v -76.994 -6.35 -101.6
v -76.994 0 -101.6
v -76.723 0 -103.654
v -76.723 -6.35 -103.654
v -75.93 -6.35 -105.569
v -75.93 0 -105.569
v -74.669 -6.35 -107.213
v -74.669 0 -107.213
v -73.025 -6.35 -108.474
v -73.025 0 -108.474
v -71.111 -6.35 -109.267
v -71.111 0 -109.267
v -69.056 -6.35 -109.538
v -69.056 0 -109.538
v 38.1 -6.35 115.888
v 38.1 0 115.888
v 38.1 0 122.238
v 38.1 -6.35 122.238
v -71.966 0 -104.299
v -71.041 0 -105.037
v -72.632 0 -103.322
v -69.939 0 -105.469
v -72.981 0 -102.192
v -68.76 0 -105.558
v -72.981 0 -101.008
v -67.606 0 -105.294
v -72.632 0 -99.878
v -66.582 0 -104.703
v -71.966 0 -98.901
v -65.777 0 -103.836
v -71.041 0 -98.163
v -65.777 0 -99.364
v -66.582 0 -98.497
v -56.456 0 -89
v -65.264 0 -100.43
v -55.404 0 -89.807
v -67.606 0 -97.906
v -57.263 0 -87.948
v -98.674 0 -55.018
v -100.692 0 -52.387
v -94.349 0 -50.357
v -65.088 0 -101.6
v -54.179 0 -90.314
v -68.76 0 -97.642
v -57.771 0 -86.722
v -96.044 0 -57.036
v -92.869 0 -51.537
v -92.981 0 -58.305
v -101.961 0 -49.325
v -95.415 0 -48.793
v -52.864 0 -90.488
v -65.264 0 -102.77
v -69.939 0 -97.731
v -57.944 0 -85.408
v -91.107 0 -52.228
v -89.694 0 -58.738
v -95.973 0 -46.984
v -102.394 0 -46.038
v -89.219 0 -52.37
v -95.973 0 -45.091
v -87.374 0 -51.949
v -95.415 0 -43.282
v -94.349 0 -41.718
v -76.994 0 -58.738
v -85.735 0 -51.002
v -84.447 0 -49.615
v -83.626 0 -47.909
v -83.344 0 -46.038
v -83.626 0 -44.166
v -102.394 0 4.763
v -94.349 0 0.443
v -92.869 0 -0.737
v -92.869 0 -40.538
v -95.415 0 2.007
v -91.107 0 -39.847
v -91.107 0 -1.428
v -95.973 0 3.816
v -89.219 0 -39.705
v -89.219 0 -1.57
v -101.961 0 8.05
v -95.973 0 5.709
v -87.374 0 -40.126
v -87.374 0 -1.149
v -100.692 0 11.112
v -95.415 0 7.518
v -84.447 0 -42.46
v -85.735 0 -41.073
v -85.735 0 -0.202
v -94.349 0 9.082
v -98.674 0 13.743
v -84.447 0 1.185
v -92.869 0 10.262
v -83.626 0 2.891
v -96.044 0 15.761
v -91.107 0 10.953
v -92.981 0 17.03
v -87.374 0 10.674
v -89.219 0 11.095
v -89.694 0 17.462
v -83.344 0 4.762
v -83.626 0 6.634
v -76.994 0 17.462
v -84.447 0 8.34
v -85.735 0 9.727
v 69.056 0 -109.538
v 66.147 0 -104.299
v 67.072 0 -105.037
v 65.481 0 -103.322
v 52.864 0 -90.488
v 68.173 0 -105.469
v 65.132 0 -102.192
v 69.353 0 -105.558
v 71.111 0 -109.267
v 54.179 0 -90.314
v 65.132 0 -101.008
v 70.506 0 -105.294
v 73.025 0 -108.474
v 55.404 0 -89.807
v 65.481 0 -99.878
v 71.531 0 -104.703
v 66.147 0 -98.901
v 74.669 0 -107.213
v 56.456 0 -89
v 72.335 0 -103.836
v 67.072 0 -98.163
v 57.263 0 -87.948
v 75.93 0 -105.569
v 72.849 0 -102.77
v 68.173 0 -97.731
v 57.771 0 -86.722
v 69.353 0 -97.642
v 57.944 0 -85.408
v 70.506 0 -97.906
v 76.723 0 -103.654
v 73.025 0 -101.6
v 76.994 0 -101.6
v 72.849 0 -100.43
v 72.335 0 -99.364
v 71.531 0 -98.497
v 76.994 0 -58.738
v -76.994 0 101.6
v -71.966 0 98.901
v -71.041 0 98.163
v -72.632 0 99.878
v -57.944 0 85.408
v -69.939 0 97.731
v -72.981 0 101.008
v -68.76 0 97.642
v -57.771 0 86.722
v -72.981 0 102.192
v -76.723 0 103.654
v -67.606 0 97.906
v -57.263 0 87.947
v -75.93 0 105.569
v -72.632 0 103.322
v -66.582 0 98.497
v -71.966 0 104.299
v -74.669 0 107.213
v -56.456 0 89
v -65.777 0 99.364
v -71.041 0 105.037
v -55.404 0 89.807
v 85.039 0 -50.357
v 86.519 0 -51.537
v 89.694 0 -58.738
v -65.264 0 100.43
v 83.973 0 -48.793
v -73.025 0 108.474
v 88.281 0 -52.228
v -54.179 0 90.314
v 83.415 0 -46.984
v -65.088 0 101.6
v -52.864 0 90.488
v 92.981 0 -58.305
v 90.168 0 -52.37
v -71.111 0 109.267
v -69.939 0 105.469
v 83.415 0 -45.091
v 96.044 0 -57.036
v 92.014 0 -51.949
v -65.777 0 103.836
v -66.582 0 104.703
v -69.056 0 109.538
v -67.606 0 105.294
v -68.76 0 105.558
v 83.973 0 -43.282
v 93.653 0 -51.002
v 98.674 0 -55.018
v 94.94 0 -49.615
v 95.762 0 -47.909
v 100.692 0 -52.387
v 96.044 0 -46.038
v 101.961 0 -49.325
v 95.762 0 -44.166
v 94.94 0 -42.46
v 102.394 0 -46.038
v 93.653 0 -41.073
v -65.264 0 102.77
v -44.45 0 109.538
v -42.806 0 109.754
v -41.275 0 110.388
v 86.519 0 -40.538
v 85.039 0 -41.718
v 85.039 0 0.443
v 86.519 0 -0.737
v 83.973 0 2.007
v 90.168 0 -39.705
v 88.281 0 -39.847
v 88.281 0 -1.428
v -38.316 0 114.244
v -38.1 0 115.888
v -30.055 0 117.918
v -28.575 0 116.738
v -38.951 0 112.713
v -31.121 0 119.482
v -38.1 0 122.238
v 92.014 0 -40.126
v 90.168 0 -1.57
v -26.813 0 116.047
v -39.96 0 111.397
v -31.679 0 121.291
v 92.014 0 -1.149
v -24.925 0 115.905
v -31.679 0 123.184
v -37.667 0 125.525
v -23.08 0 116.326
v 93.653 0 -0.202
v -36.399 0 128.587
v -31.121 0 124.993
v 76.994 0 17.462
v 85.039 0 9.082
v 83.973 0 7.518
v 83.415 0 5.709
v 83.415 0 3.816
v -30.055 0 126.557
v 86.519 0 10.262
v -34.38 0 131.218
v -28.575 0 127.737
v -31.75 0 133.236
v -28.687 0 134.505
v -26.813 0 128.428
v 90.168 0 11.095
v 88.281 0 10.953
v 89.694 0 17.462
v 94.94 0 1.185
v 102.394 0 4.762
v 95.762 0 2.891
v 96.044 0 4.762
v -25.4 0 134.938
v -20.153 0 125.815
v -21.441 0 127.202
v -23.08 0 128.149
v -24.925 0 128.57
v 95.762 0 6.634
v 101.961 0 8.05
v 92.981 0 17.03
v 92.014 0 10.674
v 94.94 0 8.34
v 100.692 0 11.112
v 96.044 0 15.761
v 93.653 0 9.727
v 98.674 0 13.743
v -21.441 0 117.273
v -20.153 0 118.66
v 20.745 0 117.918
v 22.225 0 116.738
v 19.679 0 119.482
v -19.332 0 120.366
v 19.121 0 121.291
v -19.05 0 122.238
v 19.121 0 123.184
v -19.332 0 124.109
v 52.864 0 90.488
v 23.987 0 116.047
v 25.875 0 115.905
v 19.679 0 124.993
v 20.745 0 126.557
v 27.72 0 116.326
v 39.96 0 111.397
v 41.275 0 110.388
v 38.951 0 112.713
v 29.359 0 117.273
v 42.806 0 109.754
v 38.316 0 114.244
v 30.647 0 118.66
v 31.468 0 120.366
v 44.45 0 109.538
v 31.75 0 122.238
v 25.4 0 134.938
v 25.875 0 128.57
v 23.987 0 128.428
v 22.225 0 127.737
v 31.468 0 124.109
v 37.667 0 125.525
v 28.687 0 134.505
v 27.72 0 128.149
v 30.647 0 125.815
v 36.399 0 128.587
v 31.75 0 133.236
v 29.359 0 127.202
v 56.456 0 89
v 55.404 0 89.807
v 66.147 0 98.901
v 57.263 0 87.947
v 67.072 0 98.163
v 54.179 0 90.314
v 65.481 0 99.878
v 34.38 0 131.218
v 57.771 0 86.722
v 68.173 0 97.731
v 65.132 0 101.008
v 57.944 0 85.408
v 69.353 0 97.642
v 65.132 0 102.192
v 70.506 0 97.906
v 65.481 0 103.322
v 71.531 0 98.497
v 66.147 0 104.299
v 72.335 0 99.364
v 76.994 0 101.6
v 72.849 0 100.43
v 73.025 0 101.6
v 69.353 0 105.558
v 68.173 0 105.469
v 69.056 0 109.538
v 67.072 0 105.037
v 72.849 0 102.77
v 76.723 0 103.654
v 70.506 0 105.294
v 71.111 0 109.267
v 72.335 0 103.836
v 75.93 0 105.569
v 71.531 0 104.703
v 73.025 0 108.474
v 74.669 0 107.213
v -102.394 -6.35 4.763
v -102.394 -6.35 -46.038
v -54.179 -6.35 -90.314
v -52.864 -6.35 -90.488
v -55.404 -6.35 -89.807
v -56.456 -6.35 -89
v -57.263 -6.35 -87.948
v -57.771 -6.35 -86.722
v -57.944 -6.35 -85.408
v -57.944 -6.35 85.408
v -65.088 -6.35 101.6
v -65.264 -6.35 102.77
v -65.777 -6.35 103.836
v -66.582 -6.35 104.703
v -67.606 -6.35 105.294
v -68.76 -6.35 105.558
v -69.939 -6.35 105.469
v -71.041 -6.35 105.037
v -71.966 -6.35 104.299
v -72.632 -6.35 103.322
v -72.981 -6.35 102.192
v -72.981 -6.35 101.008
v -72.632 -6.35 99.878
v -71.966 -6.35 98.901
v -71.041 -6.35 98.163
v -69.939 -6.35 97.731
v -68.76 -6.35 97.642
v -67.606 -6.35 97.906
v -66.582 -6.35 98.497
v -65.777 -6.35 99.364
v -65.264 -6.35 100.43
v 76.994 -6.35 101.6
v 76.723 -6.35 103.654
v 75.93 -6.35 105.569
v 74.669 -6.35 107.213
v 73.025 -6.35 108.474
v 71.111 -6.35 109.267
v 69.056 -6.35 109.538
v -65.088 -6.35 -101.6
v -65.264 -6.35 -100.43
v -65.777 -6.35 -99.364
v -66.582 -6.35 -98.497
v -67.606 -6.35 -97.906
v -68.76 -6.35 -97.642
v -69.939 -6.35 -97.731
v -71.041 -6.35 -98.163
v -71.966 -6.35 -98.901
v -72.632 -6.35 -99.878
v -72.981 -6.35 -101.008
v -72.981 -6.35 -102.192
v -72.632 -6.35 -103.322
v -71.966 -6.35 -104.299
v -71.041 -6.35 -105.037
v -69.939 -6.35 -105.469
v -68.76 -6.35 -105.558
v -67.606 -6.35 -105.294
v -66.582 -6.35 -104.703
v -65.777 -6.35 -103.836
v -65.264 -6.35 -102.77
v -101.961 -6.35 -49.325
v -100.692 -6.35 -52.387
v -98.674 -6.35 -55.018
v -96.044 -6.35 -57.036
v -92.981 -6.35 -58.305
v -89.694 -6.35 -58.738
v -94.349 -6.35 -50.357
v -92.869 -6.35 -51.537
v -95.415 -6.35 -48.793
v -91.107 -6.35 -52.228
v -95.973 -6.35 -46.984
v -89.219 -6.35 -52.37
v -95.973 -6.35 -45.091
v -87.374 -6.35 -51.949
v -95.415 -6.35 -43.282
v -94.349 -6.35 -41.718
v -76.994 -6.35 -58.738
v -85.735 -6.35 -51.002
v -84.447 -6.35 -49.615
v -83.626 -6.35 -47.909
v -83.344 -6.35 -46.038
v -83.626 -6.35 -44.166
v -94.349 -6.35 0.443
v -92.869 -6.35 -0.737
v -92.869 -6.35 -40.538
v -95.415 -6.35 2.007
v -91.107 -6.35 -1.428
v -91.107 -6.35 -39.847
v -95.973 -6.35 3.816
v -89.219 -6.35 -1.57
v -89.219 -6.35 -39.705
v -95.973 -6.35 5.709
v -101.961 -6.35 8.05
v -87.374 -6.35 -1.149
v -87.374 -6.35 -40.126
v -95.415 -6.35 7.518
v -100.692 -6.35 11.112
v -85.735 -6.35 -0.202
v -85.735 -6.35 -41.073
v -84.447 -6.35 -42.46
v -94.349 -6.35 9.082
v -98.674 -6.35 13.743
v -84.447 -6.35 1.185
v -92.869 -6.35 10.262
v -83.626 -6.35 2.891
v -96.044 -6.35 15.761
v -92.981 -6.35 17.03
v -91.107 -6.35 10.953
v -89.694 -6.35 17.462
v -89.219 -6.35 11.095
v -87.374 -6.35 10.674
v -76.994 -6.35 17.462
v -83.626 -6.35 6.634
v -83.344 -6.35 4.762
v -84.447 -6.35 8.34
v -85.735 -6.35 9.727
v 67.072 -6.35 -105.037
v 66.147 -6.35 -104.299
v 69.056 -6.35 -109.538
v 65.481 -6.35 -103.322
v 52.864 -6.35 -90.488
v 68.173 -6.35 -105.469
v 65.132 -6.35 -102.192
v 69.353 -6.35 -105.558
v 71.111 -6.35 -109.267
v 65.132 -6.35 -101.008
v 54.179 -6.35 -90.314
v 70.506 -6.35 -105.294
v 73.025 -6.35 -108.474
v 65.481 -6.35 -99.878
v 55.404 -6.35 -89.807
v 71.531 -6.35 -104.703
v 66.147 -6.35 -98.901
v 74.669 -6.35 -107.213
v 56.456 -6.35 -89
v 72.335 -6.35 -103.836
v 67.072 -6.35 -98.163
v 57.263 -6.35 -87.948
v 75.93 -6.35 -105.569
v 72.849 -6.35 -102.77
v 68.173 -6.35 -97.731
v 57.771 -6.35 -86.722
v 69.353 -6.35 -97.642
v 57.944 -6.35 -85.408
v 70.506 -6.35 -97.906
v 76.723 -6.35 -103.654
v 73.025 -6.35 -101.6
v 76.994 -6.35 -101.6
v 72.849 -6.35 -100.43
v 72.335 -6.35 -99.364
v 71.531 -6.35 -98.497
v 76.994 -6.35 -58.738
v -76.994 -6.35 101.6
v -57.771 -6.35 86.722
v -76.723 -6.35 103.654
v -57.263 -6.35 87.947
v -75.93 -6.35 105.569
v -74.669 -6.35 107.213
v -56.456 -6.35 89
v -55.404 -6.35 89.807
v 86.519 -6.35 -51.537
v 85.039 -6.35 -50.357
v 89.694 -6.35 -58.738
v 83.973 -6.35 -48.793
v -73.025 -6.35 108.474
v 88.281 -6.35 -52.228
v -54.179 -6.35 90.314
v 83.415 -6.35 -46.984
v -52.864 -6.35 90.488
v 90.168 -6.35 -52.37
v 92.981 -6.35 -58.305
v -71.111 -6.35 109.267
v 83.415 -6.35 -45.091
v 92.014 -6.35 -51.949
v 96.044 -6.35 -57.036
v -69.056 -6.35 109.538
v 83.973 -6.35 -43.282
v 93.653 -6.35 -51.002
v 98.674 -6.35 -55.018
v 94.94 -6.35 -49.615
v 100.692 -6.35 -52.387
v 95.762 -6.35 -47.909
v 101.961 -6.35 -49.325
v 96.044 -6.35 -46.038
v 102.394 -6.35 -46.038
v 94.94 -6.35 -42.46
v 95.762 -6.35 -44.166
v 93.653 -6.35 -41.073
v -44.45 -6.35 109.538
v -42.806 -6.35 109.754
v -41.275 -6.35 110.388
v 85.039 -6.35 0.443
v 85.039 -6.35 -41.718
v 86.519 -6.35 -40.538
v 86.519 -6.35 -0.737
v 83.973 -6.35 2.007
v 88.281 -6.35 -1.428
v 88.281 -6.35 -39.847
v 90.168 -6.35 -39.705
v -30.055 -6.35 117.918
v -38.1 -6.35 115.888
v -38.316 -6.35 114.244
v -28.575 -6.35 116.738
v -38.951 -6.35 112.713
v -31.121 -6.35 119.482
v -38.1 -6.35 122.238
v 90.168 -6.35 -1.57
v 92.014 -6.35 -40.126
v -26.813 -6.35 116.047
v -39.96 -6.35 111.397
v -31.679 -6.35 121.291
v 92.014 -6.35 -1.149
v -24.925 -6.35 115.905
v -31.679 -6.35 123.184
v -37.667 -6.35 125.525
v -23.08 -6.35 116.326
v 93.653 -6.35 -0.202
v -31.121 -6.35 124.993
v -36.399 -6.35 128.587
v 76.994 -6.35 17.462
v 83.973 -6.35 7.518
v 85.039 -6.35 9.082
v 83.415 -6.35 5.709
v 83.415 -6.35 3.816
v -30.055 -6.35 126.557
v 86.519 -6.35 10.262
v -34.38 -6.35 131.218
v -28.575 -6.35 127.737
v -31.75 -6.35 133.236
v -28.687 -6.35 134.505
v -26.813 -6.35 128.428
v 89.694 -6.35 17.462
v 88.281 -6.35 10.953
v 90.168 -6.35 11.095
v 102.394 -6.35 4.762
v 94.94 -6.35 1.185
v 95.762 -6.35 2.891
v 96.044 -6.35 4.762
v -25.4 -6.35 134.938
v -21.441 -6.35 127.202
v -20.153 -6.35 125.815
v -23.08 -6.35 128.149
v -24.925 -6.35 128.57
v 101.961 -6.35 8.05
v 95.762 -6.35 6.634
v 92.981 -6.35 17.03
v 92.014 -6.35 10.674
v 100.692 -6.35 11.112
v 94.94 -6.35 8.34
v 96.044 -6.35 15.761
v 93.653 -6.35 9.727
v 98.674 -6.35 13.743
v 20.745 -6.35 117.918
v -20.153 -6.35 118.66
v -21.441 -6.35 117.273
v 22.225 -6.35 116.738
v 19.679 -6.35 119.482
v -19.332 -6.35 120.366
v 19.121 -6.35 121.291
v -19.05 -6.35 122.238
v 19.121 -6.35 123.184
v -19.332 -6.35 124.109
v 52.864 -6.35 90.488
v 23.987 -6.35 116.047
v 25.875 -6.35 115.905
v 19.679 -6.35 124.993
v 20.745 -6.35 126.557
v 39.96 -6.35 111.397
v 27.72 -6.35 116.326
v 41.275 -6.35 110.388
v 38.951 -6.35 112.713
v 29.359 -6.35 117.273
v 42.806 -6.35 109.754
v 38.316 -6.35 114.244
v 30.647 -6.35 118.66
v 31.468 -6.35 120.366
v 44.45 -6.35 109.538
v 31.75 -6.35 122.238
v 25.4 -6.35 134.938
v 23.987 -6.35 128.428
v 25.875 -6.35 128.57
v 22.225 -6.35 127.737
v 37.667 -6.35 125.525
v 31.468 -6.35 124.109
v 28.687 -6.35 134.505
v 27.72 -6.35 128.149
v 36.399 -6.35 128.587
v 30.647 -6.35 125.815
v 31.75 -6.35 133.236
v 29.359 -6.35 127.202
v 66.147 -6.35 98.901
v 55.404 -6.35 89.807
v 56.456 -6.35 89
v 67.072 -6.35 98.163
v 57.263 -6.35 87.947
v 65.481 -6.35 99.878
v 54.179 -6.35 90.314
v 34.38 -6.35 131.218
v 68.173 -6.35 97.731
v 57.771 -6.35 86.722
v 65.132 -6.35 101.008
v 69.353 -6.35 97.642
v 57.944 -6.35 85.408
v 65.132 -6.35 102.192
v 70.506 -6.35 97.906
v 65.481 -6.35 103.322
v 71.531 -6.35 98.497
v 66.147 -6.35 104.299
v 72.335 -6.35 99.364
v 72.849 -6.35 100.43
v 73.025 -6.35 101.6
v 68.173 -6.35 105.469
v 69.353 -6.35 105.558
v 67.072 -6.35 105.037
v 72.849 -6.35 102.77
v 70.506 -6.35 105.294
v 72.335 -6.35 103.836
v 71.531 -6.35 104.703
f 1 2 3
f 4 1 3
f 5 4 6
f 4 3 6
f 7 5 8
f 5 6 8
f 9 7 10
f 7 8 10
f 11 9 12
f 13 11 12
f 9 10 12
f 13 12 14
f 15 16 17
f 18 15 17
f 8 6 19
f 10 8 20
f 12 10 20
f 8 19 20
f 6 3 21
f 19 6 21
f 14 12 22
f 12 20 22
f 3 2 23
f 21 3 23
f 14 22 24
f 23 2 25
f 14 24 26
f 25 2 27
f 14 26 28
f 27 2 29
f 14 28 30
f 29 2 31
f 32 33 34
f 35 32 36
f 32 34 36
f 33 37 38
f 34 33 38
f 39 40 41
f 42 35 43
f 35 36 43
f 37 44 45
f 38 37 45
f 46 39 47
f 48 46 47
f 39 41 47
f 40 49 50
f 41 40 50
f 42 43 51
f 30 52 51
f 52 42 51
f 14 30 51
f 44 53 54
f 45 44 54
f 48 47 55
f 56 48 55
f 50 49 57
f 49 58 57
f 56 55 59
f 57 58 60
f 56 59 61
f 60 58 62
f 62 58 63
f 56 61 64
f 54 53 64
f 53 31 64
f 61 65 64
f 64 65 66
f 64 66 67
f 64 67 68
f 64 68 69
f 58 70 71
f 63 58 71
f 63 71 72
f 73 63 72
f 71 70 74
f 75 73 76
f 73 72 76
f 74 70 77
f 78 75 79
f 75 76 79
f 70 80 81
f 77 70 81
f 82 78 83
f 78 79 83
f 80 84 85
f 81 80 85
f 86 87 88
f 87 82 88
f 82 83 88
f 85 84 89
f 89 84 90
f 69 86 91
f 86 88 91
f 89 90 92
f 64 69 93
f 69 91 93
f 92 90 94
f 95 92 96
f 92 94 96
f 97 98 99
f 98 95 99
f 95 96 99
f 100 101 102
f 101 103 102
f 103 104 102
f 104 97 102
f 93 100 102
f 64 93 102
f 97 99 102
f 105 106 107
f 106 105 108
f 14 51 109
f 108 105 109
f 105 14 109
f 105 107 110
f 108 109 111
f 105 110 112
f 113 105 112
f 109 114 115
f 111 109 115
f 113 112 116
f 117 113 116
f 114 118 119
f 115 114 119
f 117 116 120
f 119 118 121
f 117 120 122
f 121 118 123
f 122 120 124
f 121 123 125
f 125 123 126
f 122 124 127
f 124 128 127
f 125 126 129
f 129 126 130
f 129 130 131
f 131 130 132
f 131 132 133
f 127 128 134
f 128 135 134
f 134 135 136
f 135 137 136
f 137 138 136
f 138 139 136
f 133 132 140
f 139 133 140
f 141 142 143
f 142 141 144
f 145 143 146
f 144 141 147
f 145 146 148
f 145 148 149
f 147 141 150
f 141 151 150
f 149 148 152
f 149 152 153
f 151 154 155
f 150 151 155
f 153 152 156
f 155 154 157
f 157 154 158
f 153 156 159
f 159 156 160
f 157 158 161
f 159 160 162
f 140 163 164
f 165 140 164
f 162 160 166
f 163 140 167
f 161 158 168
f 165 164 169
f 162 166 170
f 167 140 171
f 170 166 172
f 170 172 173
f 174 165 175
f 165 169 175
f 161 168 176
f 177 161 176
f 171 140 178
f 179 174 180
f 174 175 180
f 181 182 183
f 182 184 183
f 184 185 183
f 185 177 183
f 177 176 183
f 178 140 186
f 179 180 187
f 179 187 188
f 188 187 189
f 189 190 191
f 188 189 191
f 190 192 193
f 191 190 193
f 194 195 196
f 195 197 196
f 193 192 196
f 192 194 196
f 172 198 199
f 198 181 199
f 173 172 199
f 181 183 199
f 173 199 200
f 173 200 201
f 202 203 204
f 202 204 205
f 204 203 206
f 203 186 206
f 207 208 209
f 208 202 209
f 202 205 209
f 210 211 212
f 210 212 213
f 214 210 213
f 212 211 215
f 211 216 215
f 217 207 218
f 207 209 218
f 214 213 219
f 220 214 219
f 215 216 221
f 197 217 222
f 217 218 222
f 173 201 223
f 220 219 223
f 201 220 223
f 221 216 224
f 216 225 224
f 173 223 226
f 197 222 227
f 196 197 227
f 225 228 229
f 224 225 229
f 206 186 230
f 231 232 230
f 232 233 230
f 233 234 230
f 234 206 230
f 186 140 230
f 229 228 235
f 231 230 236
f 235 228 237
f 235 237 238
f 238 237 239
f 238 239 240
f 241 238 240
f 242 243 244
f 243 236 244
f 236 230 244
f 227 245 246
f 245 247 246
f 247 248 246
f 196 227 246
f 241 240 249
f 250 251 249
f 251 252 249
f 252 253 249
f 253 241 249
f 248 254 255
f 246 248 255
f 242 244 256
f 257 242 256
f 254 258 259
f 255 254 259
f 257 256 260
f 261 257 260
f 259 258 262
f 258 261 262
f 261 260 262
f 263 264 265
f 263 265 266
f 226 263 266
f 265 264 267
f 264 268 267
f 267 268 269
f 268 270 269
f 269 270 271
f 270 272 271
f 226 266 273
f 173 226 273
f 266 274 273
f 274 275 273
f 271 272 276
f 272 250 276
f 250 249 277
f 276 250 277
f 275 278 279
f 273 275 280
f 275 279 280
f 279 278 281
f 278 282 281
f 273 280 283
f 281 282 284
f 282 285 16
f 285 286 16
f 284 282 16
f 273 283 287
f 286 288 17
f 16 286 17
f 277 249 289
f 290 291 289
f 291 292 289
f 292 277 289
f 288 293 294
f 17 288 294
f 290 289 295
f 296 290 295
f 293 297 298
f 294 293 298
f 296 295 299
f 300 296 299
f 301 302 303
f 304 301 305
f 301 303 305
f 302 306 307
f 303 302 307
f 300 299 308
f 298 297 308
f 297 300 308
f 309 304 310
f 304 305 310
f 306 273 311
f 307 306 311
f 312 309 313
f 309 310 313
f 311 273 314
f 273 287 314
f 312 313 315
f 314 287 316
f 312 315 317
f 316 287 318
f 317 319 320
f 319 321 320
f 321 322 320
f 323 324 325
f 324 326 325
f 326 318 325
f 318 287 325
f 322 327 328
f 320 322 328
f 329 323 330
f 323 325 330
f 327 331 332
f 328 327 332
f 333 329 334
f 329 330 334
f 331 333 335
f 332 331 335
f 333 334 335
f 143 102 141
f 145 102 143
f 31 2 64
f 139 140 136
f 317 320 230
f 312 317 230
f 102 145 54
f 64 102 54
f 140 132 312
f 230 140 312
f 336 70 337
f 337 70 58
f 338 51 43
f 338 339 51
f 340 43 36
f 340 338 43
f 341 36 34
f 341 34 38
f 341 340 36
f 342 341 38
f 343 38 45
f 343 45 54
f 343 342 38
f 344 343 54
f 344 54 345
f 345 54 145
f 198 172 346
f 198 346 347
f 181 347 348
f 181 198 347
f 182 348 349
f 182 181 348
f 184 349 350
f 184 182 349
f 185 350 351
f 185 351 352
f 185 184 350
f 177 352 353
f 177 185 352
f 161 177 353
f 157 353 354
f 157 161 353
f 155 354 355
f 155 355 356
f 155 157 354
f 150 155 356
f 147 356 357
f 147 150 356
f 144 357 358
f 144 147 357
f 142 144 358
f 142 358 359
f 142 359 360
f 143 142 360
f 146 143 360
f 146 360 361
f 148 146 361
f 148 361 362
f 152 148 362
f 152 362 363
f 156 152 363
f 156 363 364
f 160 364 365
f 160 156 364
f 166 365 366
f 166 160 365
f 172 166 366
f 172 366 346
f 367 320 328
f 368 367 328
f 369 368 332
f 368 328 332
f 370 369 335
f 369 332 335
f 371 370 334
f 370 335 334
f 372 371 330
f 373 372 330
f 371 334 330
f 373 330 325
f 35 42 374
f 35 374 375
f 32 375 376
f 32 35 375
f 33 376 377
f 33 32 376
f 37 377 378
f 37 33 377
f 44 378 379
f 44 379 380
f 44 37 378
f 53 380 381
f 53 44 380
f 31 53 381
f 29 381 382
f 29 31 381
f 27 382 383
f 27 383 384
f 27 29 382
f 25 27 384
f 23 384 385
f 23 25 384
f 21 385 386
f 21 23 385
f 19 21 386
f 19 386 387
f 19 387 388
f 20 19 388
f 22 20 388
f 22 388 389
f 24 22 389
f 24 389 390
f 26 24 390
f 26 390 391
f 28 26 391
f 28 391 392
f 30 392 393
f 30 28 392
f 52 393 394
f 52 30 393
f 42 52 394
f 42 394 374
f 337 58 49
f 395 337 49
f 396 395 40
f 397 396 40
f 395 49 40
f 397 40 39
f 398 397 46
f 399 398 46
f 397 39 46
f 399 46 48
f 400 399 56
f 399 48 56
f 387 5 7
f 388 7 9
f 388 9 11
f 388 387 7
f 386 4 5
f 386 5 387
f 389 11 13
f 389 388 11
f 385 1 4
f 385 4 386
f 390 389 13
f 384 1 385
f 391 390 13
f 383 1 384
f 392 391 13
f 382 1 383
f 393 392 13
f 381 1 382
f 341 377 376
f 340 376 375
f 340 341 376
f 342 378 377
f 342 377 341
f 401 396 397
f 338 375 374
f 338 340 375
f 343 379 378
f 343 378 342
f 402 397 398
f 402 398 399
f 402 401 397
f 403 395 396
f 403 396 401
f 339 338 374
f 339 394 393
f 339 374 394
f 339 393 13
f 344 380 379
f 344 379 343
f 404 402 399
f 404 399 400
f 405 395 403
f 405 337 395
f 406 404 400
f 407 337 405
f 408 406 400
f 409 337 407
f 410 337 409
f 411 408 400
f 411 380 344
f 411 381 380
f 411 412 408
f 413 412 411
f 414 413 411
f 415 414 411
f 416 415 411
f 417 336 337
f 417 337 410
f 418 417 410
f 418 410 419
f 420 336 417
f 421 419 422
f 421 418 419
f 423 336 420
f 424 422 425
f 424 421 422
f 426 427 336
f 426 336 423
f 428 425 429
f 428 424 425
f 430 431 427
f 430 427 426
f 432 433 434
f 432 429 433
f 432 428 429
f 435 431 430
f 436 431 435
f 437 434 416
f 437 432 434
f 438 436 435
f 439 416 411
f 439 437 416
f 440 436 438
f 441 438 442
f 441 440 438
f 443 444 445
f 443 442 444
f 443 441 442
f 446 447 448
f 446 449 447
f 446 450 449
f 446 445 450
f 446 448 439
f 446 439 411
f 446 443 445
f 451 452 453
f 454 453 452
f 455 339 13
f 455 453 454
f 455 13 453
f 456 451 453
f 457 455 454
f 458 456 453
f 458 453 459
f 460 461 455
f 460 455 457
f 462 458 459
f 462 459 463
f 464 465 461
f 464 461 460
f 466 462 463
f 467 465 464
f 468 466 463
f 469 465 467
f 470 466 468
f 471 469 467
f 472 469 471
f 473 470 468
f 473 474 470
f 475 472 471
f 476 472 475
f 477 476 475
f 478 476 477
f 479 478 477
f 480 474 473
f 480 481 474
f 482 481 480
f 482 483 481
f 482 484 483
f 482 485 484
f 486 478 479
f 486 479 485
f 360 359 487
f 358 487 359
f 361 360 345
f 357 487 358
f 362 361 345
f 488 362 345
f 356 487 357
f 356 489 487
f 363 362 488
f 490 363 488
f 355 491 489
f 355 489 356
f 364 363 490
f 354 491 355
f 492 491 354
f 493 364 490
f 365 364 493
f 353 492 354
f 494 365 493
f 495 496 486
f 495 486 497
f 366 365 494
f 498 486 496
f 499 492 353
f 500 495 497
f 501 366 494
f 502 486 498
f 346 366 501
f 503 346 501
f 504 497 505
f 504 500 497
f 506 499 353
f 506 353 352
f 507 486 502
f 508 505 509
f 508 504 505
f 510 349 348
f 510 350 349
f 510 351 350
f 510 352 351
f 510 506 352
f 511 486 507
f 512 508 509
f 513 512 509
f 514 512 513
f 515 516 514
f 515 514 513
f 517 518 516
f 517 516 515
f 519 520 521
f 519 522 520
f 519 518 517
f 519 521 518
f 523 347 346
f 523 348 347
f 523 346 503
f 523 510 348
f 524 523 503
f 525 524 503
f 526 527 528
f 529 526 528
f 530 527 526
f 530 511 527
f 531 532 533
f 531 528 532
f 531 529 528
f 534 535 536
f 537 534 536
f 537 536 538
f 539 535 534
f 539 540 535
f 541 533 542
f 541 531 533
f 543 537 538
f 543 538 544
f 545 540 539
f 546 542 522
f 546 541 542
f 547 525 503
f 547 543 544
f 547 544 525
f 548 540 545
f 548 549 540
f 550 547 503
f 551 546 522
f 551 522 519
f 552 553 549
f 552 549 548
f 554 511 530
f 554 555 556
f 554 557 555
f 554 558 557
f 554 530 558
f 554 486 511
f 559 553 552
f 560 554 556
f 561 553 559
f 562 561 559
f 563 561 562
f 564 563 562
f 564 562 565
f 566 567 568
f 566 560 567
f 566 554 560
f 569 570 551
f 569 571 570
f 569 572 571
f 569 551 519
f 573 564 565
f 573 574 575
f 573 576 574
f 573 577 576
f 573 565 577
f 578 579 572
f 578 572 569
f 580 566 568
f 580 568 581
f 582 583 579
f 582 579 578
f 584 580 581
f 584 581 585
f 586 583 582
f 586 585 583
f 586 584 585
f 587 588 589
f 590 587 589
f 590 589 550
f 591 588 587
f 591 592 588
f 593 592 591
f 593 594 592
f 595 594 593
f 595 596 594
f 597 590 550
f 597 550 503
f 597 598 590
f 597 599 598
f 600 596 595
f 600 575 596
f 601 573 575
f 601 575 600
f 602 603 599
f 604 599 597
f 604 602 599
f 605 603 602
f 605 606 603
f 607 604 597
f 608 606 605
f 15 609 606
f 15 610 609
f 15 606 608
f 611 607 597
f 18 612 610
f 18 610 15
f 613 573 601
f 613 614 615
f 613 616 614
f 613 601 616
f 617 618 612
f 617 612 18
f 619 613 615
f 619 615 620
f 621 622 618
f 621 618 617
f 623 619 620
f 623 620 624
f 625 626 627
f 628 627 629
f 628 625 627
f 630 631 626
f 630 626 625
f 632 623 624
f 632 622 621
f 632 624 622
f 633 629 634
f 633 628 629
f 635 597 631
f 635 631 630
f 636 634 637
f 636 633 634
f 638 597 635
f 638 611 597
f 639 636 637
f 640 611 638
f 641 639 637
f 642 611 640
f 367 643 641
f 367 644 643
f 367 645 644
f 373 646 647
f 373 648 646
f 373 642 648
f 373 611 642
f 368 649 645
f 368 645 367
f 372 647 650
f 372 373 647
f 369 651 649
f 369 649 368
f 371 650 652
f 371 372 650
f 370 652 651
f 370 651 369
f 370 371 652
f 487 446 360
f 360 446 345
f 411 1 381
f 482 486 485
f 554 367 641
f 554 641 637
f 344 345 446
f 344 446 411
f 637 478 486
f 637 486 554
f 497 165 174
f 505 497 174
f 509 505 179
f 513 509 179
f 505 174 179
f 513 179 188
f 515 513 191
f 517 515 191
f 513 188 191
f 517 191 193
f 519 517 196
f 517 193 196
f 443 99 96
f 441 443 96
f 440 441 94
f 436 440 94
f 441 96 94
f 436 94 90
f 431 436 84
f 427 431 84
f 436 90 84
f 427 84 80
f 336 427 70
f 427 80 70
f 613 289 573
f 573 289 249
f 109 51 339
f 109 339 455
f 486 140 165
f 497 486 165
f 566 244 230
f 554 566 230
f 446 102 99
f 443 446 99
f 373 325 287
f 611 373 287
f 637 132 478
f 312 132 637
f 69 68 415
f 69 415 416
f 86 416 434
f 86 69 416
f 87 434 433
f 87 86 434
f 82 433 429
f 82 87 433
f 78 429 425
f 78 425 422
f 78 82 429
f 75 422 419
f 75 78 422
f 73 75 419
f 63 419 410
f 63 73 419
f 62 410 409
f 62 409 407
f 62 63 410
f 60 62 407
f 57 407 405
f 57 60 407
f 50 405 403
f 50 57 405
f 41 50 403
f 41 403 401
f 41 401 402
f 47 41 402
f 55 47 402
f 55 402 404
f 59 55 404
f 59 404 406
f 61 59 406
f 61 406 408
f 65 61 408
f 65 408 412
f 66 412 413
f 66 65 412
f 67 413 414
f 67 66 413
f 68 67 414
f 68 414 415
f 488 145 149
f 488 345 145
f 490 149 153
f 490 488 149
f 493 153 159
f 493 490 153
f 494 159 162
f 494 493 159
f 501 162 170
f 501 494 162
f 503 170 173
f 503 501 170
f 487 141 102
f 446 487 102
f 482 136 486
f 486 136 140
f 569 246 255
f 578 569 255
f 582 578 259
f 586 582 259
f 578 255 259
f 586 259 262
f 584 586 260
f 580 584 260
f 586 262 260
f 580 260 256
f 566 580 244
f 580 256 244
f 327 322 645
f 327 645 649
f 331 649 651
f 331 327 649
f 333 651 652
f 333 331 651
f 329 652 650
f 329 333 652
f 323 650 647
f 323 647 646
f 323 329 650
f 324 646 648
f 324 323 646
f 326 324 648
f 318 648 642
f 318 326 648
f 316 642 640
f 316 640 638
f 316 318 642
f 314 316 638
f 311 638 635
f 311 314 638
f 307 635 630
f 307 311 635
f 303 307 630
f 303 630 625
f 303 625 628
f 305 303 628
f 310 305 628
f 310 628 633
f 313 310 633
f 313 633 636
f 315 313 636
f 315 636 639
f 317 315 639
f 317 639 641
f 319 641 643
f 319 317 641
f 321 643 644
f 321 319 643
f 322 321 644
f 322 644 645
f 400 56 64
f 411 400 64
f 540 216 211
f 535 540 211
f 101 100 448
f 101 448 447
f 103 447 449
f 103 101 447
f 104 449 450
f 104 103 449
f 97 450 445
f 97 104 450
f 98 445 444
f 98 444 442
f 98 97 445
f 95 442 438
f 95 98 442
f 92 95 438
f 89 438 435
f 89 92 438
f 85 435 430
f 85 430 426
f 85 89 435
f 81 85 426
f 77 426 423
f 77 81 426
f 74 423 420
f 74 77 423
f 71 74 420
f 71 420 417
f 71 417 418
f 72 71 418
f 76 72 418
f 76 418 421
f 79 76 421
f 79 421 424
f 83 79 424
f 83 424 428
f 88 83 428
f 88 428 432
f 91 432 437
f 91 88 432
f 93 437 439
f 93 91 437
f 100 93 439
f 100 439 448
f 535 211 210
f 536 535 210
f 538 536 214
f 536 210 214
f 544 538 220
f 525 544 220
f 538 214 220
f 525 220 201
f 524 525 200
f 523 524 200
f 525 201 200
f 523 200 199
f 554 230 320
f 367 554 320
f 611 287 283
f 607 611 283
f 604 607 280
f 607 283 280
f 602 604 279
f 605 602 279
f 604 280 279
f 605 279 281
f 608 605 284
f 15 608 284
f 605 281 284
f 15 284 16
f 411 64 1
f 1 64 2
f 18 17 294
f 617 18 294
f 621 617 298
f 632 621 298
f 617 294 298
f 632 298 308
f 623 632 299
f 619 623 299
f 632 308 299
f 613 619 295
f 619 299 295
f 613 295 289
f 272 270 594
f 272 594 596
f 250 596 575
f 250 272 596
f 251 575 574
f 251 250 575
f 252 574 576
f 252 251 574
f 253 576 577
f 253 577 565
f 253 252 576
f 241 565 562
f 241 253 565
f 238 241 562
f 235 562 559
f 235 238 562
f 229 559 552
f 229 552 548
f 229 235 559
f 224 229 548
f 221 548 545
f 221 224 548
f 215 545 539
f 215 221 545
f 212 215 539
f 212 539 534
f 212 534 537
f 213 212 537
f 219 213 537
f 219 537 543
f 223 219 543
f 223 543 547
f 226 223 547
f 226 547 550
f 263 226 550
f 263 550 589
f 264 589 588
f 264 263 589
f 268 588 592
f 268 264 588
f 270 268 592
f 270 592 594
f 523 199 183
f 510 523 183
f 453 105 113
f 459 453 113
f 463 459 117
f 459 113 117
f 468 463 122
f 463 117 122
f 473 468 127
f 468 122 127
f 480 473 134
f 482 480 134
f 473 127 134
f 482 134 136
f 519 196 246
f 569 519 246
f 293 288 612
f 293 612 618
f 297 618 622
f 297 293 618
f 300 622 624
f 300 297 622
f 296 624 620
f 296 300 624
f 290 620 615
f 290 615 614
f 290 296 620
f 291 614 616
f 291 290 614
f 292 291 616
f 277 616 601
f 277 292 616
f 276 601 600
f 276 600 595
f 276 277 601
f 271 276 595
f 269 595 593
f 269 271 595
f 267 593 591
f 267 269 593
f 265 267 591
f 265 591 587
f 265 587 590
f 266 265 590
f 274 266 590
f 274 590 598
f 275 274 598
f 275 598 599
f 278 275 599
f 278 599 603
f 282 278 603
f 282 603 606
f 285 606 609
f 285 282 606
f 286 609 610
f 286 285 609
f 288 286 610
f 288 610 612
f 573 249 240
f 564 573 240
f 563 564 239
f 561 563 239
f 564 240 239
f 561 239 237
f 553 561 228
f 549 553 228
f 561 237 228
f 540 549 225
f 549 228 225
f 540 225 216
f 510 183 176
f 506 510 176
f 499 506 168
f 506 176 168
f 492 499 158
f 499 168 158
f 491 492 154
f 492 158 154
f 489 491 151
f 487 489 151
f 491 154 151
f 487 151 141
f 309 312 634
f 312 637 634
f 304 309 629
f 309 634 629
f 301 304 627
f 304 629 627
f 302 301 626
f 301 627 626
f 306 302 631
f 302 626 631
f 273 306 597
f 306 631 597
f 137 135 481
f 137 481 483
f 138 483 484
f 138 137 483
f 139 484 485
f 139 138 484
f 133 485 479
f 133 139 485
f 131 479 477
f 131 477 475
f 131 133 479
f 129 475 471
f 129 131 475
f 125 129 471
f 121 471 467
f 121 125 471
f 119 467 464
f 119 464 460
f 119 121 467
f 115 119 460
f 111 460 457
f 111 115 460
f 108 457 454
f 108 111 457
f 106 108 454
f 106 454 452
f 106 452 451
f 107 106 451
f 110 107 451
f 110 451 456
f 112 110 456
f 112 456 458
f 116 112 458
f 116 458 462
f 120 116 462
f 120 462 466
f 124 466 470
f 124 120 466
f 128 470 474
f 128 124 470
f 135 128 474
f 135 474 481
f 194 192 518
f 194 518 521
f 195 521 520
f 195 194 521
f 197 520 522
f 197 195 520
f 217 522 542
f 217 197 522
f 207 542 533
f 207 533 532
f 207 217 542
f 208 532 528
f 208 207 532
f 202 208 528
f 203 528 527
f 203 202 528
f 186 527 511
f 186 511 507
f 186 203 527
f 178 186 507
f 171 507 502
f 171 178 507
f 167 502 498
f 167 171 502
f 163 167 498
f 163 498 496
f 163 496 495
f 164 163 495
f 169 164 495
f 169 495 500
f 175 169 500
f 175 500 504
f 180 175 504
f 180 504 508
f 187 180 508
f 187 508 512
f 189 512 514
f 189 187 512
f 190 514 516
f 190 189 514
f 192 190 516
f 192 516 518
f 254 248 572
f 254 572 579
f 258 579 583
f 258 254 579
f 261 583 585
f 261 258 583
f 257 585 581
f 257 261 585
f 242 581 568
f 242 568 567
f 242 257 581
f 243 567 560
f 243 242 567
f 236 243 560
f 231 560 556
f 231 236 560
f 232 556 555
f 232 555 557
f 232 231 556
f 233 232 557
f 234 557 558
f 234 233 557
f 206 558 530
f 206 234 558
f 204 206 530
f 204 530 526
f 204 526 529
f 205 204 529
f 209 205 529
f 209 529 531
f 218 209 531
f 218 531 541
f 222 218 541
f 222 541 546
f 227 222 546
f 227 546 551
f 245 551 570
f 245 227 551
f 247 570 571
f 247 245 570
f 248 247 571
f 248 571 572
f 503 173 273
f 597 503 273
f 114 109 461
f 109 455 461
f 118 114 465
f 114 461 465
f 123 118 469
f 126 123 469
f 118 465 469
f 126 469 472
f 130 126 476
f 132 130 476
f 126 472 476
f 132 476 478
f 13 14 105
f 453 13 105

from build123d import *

# Parameters (mm, degrees)
F0_R     = 3.96875
F0_R_2   = 6.35
F0_W     = 115.8875
F0_H     = 180.975
F1_DEPTH = 6.35
F2_R     = 5.08


with BuildPart() as f1:
    # F0 (on Front) → F1 (new body)
    with BuildSketch(Plane.XZ):
        with BuildLine():
            Line((-44.45, 109.5375), (-69.05625, 109.5375))
            ThreePointArc((-69.05625, 109.5375), (-74.66891, 107.21266), (-76.99375, 101.6))
            Line((-76.99375, 101.6), (-76.99375, 17.4625))
            Line((-76.99375, 17.4625), (-89.69375, 17.4625))
            ThreePointArc((-89.69375, 17.4625), (-98.674006, 13.742756), (-102.39375, 4.7625))
            Line((-102.39375, 4.7625), (-102.39375, -46.0375))
            ThreePointArc((-102.39375, -46.0375), (-98.674006, -55.017756), (-89.69375, -58.7375))
            Line((-89.69375, -58.7375), (-76.99375, -58.7375))
            Line((-76.99375, -58.7375), (-76.99375, -101.6))
            ThreePointArc((-76.99375, -101.6), (-74.66891, -107.21266), (-69.05625, -109.5375))
            Line((-69.05625, -109.5375), (69.05625, -109.5375))
            ThreePointArc((69.05625, -109.5375), (74.66891, -107.21266), (76.99375, -101.6))
            Line((76.99375, -101.6), (76.99375, -58.7375))
            Line((76.99375, -58.7375), (89.69375, -58.7375))
            ThreePointArc((89.69375, -58.7375), (98.674006, -55.017756), (102.39375, -46.0375))
            Line((102.39375, -46.0375), (102.39375, 4.7625))
            ThreePointArc((102.39375, 4.7625), (98.674006, 13.742756), (89.69375, 17.4625))
            Line((89.69375, 17.4625), (76.99375, 17.4625))
            Line((76.99375, 17.4625), (76.99375, 101.6))
            ThreePointArc((76.99375, 101.6), (74.66891, 107.21266), (69.05625, 109.5375))
            Line((69.05625, 109.5375), (44.45, 109.5375))
            ThreePointArc((44.45, 109.5375), (39.959872, 111.397372), (38.1, 115.8875))
            Line((38.1, 115.8875), (38.1, 122.2375))
            ThreePointArc((38.1, 122.2375), (34.380256, 131.217756), (25.4, 134.9375))
            Line((25.4, 134.9375), (-25.4, 134.9375))
            ThreePointArc((-25.4, 134.9375), (-34.380256, 131.217756), (-38.1, 122.2375))
            Line((-38.1, 122.2375), (-38.1, 115.8875))
            ThreePointArc((-38.1, 115.8875), (-39.959872, 111.397372), (-44.45, 109.5375))
        make_face()
        with Locations((-69.05625, -101.6)):
            Circle(F0_R, mode=Mode.SUBTRACT)
        with Locations((-89.69375, -46.0375)):
            Circle(F0_R_2, mode=Mode.SUBTRACT)
        with Locations((-89.69375, 4.7625)):
            Circle(F0_R_2, mode=Mode.SUBTRACT)
        with Locations((69.05625, -101.6)):
            Circle(F0_R, mode=Mode.SUBTRACT)
        Rectangle(F0_W, F0_H, mode=Mode.SUBTRACT)
        with Locations((89.69375, -46.0375)):
            Circle(F0_R_2, mode=Mode.SUBTRACT)
        with Locations((89.69375, 4.7625)):
            Circle(F0_R_2, mode=Mode.SUBTRACT)
        with Locations((-69.05625, 101.6)):
            Circle(F0_R, mode=Mode.SUBTRACT)
        with Locations((-25.4, 122.2375)):
            Circle(F0_R_2, mode=Mode.SUBTRACT)
        with Locations((25.4, 122.2375)):
            Circle(F0_R_2, mode=Mode.SUBTRACT)
        with Locations((69.05625, 101.6)):
            Circle(F0_R, mode=Mode.SUBTRACT)
    extrude(amount=F1_DEPTH)

    # F2
    f2_edges = [f1.edges().sort_by_distance(p)[0] for p in [
        (-57.94375, -3.175, 90.4875),
        (57.94375, -3.175, 90.4875),
        (57.94375, -3.175, -90.4875),
        (-57.94375, -3.175, -90.4875),
    ]]
    fillet(f2_edges, radius=F2_R)


solid = f1.part
